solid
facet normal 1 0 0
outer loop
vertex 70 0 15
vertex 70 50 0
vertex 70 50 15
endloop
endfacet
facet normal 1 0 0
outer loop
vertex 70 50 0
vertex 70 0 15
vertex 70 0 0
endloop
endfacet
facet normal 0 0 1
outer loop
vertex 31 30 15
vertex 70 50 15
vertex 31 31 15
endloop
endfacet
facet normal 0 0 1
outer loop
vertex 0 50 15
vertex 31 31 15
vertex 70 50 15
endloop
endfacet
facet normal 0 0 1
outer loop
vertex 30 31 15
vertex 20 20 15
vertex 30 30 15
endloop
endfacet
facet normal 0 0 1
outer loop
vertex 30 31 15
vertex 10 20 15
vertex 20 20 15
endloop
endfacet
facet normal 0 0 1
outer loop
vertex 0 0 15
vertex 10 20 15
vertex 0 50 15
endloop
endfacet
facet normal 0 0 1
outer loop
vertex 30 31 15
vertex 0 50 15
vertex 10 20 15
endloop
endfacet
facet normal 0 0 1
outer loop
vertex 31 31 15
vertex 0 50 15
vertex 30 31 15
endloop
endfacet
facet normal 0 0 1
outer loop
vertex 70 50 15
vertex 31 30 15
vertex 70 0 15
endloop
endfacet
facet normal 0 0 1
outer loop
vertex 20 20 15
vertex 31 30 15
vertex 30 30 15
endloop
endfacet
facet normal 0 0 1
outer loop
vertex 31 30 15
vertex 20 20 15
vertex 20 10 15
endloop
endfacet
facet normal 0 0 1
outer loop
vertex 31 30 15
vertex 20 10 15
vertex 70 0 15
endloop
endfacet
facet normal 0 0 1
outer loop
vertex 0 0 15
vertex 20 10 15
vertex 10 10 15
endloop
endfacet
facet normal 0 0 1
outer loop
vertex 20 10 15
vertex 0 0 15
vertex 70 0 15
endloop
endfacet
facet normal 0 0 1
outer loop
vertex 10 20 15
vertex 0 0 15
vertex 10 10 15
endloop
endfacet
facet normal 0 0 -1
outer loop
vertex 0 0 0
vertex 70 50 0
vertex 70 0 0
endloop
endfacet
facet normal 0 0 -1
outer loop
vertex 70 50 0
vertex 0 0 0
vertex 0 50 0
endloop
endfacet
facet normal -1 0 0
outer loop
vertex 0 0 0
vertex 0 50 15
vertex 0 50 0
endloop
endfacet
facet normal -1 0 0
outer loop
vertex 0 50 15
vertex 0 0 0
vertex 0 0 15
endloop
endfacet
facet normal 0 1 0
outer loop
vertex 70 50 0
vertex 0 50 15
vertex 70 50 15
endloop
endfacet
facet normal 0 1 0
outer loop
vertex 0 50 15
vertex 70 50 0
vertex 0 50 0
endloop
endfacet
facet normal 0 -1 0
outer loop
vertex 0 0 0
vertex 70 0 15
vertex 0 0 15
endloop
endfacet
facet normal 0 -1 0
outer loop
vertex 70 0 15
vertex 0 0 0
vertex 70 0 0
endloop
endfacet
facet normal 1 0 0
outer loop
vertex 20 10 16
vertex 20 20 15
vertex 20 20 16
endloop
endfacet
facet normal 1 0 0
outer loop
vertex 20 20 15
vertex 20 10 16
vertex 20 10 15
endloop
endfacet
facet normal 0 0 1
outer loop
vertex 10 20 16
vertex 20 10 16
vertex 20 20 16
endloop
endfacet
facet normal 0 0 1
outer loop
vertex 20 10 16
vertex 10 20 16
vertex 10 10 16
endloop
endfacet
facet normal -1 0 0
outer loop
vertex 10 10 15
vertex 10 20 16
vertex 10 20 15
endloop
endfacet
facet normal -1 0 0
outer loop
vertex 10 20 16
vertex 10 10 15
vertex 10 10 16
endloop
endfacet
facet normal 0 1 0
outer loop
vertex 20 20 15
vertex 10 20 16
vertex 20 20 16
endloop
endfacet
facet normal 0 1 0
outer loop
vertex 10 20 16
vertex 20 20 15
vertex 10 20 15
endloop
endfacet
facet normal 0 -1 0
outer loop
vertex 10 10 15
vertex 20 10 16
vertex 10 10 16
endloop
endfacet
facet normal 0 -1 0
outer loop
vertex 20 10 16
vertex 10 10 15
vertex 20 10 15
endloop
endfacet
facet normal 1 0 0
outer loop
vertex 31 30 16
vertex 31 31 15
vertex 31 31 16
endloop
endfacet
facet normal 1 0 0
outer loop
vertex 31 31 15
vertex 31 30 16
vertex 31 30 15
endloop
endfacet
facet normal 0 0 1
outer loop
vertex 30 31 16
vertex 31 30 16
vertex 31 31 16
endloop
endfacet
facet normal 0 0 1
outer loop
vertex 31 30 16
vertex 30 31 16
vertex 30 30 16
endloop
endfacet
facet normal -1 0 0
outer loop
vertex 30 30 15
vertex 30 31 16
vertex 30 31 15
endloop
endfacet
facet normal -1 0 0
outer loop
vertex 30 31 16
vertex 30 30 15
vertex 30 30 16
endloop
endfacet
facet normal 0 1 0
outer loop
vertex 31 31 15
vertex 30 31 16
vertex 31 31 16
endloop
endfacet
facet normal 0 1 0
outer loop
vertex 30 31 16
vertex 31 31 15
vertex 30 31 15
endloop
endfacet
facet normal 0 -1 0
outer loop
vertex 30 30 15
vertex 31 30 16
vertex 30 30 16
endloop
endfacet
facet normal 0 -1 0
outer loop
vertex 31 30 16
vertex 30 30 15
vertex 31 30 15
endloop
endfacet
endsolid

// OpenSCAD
// OpenSCAD Enclosure
//  By Carsten Thue-Bludworth

$fa = 1;
$fs = 0.4;

body_x  = 70;
body_y = 50;
body_z  = 15;

// Enclosure body
cube([body_x, body_y, body_z]);

// Top cutouts
co_x  = 10;
co_offset_x = 10;
co_y  = 10;
co_offset_y = 10;
co_z  =  1;
translate([0, 0, body_z])
    cutout(co_x, co_y, co_offset_x, co_offset_y);
    
translate([0, 0, body_z])
    cutout(x_off = 30, y_off = 30);
    
module cutout(x=1, y=1, x_off=0, y_off=0) {
    translate([x_off, y_off, 0])
        cube([x, y, 1]);
}
